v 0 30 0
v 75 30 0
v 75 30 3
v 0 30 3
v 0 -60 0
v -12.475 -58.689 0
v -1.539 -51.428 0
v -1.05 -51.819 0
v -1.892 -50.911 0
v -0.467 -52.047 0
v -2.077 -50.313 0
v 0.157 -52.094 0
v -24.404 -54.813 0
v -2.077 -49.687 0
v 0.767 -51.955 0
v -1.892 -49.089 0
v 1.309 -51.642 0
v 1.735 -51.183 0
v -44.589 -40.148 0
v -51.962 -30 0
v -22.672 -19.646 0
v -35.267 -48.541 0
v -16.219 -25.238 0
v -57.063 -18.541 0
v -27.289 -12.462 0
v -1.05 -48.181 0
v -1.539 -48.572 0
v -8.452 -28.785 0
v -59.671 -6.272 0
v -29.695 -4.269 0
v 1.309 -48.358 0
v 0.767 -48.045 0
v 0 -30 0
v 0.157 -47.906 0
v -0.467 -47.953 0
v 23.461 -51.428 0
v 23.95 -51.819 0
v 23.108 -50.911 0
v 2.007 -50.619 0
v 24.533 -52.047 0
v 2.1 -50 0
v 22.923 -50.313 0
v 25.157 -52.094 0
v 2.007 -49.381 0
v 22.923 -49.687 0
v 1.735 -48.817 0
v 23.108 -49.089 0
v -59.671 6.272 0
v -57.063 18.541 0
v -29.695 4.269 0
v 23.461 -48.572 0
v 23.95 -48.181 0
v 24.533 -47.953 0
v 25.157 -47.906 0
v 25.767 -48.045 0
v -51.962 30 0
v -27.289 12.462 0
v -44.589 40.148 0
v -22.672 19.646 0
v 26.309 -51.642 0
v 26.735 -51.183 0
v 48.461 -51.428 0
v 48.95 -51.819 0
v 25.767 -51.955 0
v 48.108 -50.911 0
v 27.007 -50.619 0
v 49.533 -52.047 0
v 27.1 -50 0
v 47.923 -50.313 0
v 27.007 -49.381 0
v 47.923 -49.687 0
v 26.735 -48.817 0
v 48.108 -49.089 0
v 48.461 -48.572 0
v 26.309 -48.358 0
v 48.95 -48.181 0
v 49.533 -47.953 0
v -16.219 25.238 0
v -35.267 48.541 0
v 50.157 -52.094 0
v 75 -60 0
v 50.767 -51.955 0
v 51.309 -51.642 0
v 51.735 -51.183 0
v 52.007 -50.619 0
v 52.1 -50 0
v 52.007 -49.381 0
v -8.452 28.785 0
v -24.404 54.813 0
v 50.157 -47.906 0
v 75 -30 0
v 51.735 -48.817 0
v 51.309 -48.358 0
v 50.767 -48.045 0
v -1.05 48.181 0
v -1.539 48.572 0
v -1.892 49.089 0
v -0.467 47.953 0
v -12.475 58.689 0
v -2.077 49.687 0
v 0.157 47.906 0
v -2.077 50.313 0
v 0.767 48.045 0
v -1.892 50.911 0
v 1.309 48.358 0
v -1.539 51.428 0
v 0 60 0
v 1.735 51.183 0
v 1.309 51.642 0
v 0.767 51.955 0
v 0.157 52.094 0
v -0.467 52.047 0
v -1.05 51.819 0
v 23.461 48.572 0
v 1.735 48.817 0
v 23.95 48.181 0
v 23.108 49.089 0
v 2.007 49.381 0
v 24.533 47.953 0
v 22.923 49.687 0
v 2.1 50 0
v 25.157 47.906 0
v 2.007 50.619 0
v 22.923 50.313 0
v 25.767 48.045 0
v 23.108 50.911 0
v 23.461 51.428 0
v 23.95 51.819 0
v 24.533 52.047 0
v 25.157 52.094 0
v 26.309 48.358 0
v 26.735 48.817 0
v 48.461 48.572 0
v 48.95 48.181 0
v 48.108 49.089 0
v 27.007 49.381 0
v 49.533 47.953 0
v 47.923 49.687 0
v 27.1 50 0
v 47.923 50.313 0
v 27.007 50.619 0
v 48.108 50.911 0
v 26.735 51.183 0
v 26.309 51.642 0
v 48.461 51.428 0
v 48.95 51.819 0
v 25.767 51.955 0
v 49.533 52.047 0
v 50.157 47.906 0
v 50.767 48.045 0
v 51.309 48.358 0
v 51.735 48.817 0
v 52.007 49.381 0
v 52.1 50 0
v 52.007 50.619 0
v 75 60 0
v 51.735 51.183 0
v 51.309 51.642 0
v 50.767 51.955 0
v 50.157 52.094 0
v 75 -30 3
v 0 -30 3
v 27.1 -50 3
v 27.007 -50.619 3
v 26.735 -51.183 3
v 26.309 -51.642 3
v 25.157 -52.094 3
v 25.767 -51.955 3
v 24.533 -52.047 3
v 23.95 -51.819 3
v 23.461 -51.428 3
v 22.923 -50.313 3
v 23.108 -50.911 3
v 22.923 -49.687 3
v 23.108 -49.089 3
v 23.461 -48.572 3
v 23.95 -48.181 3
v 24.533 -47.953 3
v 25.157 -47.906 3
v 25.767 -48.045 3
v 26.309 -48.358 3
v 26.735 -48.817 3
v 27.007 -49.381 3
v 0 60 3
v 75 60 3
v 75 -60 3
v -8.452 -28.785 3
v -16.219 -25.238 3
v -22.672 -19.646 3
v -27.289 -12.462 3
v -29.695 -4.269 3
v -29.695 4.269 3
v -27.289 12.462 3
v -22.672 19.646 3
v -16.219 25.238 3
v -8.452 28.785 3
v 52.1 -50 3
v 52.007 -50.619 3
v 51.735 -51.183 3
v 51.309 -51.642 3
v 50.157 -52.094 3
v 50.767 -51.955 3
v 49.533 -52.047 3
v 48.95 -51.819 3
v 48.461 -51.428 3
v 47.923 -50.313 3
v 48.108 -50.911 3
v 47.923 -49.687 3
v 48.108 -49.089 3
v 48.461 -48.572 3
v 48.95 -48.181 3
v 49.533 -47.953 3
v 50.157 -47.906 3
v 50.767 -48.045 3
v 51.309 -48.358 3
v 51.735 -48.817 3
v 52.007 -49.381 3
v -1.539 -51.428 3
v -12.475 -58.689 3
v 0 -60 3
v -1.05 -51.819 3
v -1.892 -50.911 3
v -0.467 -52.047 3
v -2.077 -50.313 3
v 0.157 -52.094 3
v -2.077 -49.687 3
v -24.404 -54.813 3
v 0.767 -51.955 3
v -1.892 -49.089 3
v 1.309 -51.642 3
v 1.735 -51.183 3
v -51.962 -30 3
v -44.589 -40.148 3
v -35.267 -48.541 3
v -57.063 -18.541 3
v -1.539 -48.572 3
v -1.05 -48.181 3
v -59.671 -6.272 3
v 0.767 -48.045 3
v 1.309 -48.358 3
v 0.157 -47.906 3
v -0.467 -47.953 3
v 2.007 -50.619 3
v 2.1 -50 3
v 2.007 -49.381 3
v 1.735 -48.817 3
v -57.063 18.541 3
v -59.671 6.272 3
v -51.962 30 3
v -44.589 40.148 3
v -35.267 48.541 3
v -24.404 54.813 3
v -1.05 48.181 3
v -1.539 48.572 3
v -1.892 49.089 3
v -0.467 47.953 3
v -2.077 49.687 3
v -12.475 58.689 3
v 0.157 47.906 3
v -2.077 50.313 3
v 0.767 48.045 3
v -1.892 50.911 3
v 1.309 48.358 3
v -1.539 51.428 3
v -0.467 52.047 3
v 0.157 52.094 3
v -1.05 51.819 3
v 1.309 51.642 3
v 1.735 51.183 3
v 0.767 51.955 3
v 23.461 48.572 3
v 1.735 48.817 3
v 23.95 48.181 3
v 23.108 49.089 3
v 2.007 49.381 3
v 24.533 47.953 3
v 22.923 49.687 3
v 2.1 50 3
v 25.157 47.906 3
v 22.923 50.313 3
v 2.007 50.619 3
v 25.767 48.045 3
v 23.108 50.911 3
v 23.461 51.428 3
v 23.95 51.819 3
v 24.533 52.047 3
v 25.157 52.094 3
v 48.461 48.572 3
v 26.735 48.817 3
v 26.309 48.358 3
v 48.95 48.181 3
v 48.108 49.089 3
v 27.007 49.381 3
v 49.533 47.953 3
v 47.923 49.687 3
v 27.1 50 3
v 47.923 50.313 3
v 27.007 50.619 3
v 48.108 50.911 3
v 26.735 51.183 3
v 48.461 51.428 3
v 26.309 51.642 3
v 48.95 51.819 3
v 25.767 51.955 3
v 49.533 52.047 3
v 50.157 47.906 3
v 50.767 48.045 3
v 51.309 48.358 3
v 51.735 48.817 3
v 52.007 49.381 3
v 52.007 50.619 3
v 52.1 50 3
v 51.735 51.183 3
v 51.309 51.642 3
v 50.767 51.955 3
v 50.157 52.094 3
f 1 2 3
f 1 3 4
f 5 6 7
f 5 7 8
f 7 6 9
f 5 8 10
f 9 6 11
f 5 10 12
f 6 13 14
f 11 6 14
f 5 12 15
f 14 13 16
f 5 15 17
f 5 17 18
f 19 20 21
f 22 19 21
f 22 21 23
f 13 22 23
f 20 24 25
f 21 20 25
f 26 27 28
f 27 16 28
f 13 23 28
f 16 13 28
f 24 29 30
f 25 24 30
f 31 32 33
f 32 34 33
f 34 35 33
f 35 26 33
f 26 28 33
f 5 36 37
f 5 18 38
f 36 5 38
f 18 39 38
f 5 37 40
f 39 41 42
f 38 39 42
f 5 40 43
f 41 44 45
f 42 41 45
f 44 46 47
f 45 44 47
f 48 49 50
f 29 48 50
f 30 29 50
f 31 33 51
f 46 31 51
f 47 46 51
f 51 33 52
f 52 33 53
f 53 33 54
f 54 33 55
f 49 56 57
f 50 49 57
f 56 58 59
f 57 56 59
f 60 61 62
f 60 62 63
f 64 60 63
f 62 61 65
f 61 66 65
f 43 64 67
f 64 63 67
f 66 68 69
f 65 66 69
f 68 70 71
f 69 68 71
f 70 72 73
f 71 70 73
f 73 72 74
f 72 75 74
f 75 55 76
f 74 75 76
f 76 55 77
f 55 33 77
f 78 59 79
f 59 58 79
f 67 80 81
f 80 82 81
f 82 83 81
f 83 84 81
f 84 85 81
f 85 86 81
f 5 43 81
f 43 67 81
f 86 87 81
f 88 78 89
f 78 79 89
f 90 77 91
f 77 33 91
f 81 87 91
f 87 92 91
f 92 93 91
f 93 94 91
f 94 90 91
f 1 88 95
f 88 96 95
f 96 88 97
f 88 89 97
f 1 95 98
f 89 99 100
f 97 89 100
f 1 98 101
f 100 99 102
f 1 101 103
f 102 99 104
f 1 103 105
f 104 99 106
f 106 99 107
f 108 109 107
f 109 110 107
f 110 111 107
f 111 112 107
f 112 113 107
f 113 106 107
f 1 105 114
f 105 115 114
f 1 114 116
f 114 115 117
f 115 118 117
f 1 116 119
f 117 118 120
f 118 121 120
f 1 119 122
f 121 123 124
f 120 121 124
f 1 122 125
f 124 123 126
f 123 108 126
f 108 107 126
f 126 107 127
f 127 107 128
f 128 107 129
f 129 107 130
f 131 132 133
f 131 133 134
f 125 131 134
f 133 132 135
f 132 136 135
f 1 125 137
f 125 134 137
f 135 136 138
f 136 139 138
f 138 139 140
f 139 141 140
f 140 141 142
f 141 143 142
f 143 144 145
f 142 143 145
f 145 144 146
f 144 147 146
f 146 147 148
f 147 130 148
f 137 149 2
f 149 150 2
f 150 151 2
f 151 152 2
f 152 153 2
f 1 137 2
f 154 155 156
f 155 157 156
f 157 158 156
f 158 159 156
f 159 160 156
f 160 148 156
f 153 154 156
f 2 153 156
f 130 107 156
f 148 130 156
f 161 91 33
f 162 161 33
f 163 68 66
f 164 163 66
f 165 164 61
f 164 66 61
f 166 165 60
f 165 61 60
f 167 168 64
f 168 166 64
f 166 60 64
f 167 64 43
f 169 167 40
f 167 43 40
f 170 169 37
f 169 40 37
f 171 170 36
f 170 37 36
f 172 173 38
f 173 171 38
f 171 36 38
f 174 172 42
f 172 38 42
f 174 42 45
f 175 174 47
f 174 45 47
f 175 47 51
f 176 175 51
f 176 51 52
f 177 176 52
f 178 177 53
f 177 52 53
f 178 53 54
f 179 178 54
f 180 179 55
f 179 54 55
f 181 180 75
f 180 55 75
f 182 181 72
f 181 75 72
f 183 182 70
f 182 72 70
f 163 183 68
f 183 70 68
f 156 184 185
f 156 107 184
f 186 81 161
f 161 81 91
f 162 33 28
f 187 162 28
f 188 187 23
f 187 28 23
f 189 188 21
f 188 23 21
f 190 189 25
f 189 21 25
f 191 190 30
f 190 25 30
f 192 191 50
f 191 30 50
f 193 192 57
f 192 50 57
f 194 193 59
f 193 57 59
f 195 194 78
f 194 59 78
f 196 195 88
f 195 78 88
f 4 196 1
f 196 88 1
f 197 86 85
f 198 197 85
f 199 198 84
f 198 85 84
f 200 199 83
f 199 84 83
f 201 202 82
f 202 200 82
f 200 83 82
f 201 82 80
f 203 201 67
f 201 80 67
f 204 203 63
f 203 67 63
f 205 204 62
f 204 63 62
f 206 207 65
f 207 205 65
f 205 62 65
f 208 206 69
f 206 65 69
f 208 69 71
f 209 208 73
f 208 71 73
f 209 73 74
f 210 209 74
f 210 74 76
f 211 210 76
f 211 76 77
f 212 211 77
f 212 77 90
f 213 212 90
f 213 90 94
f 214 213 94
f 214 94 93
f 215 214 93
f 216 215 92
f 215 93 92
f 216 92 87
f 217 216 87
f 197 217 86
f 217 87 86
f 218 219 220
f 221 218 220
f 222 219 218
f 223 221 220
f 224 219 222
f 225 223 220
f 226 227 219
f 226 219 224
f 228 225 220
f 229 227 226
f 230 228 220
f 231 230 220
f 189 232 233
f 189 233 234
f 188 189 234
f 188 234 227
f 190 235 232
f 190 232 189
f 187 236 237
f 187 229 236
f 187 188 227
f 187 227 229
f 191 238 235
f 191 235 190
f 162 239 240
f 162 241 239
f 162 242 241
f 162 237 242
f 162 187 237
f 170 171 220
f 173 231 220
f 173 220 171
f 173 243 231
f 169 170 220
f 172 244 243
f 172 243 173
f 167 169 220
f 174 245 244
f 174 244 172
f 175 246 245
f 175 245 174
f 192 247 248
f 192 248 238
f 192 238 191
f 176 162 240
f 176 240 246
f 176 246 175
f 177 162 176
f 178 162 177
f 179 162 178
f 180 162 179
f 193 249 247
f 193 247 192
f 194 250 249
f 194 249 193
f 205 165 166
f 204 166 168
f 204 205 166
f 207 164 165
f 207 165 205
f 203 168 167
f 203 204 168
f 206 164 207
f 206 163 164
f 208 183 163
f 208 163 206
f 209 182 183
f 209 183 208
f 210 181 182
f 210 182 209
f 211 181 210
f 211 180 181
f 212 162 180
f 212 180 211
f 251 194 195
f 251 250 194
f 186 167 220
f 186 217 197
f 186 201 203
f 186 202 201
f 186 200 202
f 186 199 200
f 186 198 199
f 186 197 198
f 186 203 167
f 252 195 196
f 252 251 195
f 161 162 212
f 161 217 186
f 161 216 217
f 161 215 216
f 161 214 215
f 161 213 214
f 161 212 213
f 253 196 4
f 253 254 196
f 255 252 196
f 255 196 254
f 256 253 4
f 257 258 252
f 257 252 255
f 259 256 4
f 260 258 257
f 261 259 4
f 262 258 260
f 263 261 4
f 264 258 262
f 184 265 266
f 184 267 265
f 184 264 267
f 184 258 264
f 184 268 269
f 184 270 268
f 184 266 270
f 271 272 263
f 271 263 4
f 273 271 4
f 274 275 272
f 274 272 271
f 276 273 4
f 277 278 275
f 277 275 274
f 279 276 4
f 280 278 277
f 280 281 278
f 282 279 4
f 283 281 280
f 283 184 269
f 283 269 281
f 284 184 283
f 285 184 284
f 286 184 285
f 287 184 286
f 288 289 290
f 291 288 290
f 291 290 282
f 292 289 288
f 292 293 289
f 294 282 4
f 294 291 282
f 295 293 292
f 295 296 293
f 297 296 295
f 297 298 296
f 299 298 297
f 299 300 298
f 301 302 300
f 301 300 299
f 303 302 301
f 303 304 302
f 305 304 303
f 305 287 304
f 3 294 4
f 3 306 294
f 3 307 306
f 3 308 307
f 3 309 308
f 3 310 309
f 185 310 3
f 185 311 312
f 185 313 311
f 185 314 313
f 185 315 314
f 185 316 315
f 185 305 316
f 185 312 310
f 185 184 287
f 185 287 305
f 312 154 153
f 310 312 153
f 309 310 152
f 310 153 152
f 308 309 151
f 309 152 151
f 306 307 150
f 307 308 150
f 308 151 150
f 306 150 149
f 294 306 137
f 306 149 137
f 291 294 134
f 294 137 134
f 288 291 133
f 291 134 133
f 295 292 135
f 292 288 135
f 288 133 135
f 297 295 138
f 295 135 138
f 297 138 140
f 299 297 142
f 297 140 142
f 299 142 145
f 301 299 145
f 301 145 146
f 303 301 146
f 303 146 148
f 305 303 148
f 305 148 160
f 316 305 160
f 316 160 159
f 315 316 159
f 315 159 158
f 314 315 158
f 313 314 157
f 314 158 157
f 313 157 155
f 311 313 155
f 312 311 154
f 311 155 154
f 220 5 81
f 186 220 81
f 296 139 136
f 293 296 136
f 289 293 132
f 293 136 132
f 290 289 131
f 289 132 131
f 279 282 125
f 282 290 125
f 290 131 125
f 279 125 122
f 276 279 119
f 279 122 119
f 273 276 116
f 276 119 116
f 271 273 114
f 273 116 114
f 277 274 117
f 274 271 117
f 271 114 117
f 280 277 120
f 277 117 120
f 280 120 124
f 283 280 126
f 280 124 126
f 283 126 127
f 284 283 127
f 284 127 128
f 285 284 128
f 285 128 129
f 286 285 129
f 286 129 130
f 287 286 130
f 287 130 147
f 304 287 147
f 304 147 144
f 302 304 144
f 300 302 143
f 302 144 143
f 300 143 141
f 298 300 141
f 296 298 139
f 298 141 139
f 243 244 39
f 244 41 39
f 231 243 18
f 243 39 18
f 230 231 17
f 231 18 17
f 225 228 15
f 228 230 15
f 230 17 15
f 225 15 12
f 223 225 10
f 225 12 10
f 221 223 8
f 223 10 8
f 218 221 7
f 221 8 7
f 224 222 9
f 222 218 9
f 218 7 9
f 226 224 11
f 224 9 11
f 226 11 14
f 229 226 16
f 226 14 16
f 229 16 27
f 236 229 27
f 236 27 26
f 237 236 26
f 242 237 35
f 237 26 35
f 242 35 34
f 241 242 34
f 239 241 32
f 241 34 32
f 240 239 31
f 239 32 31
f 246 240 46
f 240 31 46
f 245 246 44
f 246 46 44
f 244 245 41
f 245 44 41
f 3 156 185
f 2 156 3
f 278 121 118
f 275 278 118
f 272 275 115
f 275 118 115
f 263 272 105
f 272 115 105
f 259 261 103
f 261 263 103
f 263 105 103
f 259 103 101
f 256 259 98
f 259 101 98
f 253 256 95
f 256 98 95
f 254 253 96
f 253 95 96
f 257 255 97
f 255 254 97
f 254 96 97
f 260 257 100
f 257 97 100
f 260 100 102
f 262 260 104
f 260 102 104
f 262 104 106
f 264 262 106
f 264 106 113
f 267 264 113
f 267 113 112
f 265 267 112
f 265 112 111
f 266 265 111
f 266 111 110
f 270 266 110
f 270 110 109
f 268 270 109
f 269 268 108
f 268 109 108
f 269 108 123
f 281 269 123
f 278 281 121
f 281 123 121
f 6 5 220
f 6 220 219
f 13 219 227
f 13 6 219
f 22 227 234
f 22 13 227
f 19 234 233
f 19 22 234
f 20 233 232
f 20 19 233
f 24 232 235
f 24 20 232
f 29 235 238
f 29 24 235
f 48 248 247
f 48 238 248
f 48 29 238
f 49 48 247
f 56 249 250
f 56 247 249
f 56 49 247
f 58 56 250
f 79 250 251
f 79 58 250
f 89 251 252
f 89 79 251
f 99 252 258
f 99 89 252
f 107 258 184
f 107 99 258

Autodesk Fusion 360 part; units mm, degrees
sketch "草图1" plane through (0, 0, 0) normal (0, 0, 1) x (1, 0, 0)
  line L0 (0, 60) -> (75, 60)
  line L1 (75, 60) -> (75, 30)
  line L2 (75, 30) -> (0, 30)
  line L3 (0, -60) -> (75, -60)
  line L4 (75, -60) -> (75, -30)
  line L5 (75, -30) -> (0, -30)
  arc A0 (0, 60) -> (0, -60) centre (0, 0) ccw
  arc A1 (0, 30) -> (0, -30) centre (0, 0) ccw
  circle A2 centre (0, 50) radius 2.1
  circle A3 centre (25, 50) radius 2.1
  circle A4 centre (50, 50) radius 2.1
  circle A5 centre (0, -50) radius 2.1
  circle A6 centre (25, -50) radius 2.1
  circle A7 centre (50, -50) radius 2.1
  dimension "d1" = 4.2
  dimension "d2" = 4.2
  dimension "d3" = 4.2
  dimension "d4" = 4.2
  dimension "d5" = 4.2
  dimension "d6" = 4.2
extrude "拉伸1" add sketch "草图1" along normal blind 3
sketch "草图2" plane through (0, 0, 0) normal (0, 1, 0) x (1, 0, 0)
sketch "草图3" plane through (0, 0, 0) normal (0, 0, 1) x (1, 0, 0)
